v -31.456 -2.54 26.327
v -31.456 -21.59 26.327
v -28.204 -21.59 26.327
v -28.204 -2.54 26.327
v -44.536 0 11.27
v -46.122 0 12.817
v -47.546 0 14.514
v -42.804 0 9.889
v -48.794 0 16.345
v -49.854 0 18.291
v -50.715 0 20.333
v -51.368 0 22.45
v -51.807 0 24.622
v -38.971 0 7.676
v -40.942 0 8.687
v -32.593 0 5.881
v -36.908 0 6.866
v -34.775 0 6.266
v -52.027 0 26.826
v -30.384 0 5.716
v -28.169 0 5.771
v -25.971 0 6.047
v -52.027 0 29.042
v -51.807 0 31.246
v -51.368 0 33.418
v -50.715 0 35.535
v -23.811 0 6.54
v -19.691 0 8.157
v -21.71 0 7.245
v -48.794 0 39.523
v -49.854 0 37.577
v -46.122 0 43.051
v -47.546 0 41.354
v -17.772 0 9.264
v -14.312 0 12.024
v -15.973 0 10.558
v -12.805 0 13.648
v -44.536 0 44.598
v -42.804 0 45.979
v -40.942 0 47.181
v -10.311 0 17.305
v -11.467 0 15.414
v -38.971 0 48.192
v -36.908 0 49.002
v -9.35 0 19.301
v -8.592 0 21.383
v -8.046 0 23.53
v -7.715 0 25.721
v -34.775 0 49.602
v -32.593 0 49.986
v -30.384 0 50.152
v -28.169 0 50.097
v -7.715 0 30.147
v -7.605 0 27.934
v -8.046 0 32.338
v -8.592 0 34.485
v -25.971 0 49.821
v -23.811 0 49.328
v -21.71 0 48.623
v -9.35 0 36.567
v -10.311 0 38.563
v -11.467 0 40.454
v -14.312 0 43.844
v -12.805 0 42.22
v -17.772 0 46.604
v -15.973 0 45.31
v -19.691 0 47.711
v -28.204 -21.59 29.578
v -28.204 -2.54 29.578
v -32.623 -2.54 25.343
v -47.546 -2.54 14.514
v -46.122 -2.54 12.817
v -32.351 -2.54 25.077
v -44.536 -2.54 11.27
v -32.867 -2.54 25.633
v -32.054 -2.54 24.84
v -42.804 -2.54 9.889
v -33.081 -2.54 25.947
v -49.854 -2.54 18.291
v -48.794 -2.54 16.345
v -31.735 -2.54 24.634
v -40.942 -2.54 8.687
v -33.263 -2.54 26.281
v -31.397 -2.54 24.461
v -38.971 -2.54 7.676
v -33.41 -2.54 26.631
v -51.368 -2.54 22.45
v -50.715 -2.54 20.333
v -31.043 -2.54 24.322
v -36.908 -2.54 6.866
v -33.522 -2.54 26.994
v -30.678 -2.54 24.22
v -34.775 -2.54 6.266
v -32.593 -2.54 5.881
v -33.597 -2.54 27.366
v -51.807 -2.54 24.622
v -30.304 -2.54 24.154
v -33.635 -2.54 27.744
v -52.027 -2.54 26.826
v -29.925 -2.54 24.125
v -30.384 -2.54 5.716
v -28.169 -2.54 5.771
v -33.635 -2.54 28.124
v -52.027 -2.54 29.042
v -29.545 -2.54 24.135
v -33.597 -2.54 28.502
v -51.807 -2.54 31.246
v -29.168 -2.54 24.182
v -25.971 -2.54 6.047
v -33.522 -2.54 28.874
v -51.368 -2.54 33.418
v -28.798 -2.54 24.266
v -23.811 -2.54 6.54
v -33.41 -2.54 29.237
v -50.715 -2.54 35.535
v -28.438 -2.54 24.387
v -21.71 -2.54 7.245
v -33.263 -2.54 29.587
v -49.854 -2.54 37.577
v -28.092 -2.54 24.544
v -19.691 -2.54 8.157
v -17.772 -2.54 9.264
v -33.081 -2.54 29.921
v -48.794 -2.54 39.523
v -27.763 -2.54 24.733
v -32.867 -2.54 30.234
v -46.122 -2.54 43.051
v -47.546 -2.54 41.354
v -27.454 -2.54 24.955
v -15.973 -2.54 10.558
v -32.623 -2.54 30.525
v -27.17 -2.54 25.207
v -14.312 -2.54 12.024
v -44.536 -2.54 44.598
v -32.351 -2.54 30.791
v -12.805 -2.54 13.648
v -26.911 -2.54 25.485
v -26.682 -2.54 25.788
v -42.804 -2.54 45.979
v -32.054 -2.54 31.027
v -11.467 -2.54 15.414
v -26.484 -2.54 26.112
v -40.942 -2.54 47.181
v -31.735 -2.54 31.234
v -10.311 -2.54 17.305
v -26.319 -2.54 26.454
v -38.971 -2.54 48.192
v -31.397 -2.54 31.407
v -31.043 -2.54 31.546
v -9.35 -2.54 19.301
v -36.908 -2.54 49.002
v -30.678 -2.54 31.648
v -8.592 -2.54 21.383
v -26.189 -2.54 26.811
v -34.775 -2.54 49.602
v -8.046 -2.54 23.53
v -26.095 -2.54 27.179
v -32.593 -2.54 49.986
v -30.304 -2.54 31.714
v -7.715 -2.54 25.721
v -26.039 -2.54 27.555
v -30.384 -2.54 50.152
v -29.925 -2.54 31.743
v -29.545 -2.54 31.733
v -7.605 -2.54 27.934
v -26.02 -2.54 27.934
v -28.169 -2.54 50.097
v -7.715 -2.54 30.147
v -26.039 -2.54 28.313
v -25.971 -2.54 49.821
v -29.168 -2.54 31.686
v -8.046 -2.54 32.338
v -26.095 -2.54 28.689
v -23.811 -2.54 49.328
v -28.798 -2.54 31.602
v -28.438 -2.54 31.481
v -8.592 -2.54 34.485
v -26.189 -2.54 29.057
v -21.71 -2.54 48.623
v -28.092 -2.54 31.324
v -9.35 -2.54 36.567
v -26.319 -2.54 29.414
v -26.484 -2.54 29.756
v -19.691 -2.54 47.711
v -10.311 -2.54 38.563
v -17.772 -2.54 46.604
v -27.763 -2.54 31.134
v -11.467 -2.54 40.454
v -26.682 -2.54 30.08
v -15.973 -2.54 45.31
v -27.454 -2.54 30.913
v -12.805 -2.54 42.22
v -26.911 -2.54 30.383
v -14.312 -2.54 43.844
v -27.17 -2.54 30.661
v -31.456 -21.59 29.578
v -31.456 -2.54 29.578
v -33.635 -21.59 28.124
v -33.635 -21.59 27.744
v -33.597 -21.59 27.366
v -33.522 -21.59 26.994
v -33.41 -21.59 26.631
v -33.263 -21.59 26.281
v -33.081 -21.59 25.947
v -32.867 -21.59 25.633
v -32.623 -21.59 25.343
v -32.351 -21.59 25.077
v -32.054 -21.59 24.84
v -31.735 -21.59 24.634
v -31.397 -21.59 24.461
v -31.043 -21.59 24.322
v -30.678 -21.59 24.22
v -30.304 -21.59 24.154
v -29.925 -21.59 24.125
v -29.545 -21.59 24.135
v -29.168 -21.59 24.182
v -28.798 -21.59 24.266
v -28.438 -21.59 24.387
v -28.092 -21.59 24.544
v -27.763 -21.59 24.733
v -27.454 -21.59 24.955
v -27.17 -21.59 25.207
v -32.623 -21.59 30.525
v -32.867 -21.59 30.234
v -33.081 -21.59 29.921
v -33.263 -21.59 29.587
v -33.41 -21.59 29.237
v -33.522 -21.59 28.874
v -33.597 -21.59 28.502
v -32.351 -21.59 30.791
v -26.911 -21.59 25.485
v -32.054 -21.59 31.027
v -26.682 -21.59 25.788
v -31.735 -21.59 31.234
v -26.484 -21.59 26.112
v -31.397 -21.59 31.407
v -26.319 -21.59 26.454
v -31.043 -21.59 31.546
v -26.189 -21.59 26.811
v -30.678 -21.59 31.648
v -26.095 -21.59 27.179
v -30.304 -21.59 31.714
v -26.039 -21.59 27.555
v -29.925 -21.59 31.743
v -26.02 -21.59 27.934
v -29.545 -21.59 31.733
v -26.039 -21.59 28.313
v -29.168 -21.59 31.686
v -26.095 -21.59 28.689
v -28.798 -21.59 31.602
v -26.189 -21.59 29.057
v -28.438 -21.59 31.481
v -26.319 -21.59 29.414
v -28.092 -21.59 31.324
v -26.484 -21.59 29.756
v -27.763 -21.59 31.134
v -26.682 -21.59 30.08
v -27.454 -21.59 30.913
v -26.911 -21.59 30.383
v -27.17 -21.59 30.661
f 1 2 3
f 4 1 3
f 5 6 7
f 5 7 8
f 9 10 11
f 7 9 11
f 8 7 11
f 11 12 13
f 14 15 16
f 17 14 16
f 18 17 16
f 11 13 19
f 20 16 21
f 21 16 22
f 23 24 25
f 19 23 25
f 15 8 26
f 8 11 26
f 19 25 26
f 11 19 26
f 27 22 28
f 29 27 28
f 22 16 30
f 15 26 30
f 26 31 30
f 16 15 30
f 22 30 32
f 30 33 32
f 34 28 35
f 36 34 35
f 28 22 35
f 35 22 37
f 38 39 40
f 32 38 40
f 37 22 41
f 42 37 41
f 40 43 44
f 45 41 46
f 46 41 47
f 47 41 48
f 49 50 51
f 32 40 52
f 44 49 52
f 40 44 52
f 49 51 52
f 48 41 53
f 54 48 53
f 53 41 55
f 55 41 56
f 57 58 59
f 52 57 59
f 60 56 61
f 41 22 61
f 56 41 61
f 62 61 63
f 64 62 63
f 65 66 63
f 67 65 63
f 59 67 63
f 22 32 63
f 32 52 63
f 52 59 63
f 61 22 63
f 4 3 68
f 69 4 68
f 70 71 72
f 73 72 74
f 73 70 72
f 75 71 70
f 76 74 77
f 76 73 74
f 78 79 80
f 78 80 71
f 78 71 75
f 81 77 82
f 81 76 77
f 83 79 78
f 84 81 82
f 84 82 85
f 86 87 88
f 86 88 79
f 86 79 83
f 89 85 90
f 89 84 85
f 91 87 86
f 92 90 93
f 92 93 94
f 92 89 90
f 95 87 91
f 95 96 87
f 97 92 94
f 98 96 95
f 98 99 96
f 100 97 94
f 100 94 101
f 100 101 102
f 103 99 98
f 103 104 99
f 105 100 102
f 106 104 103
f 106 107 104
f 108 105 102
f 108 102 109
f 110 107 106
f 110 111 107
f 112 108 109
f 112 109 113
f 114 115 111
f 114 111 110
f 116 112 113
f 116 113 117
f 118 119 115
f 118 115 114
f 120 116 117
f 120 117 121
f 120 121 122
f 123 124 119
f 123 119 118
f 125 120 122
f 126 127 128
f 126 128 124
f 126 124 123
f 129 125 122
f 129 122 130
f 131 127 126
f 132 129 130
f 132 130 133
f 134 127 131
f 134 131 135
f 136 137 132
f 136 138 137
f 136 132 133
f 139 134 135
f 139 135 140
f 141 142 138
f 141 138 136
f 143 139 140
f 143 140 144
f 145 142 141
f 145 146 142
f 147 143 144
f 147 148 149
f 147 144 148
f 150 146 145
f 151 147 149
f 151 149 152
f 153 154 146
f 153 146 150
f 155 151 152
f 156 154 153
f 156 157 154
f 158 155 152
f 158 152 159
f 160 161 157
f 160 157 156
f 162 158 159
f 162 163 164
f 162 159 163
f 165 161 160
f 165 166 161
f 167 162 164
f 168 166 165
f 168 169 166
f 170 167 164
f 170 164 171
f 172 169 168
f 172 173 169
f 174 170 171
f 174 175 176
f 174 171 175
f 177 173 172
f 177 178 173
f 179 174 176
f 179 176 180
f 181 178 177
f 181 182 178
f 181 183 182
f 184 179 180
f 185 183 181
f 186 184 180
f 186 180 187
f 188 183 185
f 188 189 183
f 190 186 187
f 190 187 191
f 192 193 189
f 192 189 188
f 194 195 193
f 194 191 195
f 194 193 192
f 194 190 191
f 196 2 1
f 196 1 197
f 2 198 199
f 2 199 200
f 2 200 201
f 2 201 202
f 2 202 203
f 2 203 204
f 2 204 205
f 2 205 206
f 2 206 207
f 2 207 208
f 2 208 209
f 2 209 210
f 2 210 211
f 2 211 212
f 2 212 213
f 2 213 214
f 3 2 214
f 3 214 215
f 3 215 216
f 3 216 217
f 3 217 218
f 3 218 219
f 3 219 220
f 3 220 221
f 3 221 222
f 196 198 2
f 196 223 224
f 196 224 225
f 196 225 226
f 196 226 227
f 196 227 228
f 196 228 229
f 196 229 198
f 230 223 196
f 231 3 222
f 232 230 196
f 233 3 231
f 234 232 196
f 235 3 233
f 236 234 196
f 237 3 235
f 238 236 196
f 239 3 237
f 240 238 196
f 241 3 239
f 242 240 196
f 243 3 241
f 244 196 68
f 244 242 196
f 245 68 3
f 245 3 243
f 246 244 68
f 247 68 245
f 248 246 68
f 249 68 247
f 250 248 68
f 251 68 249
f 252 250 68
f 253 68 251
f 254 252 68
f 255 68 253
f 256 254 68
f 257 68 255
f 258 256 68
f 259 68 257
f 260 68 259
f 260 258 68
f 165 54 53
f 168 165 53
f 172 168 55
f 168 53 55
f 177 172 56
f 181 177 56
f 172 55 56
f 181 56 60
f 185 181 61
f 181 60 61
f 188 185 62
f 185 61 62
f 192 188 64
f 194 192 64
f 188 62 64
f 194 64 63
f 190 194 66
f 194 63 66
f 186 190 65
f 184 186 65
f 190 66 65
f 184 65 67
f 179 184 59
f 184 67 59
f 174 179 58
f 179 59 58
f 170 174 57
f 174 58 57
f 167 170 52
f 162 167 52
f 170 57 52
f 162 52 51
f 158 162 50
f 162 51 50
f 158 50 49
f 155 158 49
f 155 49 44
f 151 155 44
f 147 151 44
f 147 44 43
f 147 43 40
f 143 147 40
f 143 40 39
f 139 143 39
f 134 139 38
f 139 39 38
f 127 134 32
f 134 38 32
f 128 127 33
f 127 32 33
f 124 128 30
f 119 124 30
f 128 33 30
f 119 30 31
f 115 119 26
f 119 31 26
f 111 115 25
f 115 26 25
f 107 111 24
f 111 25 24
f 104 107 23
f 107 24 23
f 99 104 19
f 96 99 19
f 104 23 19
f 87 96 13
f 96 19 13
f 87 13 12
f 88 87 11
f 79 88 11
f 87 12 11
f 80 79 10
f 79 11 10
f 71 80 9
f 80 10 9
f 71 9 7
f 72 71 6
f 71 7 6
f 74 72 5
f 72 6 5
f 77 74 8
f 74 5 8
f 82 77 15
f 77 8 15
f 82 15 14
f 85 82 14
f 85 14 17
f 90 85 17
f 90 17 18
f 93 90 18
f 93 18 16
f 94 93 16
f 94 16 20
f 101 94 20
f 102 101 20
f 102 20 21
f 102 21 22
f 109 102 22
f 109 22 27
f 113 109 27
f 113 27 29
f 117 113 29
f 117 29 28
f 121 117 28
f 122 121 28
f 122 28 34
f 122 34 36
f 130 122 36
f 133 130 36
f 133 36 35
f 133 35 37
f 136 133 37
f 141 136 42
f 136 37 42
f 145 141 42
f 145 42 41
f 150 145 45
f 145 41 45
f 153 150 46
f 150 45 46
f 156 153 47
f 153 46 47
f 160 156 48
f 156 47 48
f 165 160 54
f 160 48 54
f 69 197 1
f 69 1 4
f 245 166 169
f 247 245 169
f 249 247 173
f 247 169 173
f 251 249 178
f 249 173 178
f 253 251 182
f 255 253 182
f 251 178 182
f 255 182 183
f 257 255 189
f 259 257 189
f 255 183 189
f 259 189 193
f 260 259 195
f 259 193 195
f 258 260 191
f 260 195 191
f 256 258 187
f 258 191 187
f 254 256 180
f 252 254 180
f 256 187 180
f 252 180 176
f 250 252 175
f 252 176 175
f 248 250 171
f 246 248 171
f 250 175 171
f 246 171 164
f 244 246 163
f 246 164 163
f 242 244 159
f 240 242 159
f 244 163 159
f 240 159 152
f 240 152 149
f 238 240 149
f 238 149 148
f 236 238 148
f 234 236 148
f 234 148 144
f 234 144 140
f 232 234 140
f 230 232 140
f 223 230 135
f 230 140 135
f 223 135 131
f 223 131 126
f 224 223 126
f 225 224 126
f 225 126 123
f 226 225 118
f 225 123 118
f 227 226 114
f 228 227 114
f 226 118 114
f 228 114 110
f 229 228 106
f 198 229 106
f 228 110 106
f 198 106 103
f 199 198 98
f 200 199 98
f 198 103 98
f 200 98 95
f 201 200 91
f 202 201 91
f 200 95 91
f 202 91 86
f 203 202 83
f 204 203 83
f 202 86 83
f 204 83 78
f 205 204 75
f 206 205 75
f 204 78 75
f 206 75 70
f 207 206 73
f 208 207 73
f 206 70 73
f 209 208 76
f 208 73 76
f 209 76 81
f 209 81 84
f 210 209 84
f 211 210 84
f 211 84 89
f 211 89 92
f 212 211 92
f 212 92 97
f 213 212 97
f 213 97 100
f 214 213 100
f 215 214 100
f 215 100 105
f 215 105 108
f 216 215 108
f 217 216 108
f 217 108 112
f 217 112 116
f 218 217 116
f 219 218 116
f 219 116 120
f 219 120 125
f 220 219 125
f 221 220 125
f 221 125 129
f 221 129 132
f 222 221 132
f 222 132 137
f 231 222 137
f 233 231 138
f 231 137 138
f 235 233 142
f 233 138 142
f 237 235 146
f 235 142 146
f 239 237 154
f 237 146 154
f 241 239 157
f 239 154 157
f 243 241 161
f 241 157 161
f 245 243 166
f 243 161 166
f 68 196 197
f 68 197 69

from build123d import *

# Parameters (mm, degrees)
F0_R     = 22.225
F1_DEPTH = 2.54
F2_R     = 3.81
F2_W     = 3.2512
F2_H     = 3.2512
F3_DEPTH = 19.05


with BuildPart() as f1:
    # F0 (on Front) → F1 (new body)
    with BuildSketch(Plane.XZ):
        with Locations((-29.829953, 27.933979)):
            Circle(F0_R)
    extrude(amount=F1_DEPTH)

    # F2 (on face) → F3 (join)
    with BuildSketch(Plane.XZ.offset(2.54)):
        with Locations((-29.829953, 27.933979)):
            Circle(F2_R)
        with Locations((-29.829953, 27.952339)):
            Rectangle(F2_W, F2_H, mode=Mode.SUBTRACT)
    extrude(amount=F3_DEPTH)


solid = f1.part
